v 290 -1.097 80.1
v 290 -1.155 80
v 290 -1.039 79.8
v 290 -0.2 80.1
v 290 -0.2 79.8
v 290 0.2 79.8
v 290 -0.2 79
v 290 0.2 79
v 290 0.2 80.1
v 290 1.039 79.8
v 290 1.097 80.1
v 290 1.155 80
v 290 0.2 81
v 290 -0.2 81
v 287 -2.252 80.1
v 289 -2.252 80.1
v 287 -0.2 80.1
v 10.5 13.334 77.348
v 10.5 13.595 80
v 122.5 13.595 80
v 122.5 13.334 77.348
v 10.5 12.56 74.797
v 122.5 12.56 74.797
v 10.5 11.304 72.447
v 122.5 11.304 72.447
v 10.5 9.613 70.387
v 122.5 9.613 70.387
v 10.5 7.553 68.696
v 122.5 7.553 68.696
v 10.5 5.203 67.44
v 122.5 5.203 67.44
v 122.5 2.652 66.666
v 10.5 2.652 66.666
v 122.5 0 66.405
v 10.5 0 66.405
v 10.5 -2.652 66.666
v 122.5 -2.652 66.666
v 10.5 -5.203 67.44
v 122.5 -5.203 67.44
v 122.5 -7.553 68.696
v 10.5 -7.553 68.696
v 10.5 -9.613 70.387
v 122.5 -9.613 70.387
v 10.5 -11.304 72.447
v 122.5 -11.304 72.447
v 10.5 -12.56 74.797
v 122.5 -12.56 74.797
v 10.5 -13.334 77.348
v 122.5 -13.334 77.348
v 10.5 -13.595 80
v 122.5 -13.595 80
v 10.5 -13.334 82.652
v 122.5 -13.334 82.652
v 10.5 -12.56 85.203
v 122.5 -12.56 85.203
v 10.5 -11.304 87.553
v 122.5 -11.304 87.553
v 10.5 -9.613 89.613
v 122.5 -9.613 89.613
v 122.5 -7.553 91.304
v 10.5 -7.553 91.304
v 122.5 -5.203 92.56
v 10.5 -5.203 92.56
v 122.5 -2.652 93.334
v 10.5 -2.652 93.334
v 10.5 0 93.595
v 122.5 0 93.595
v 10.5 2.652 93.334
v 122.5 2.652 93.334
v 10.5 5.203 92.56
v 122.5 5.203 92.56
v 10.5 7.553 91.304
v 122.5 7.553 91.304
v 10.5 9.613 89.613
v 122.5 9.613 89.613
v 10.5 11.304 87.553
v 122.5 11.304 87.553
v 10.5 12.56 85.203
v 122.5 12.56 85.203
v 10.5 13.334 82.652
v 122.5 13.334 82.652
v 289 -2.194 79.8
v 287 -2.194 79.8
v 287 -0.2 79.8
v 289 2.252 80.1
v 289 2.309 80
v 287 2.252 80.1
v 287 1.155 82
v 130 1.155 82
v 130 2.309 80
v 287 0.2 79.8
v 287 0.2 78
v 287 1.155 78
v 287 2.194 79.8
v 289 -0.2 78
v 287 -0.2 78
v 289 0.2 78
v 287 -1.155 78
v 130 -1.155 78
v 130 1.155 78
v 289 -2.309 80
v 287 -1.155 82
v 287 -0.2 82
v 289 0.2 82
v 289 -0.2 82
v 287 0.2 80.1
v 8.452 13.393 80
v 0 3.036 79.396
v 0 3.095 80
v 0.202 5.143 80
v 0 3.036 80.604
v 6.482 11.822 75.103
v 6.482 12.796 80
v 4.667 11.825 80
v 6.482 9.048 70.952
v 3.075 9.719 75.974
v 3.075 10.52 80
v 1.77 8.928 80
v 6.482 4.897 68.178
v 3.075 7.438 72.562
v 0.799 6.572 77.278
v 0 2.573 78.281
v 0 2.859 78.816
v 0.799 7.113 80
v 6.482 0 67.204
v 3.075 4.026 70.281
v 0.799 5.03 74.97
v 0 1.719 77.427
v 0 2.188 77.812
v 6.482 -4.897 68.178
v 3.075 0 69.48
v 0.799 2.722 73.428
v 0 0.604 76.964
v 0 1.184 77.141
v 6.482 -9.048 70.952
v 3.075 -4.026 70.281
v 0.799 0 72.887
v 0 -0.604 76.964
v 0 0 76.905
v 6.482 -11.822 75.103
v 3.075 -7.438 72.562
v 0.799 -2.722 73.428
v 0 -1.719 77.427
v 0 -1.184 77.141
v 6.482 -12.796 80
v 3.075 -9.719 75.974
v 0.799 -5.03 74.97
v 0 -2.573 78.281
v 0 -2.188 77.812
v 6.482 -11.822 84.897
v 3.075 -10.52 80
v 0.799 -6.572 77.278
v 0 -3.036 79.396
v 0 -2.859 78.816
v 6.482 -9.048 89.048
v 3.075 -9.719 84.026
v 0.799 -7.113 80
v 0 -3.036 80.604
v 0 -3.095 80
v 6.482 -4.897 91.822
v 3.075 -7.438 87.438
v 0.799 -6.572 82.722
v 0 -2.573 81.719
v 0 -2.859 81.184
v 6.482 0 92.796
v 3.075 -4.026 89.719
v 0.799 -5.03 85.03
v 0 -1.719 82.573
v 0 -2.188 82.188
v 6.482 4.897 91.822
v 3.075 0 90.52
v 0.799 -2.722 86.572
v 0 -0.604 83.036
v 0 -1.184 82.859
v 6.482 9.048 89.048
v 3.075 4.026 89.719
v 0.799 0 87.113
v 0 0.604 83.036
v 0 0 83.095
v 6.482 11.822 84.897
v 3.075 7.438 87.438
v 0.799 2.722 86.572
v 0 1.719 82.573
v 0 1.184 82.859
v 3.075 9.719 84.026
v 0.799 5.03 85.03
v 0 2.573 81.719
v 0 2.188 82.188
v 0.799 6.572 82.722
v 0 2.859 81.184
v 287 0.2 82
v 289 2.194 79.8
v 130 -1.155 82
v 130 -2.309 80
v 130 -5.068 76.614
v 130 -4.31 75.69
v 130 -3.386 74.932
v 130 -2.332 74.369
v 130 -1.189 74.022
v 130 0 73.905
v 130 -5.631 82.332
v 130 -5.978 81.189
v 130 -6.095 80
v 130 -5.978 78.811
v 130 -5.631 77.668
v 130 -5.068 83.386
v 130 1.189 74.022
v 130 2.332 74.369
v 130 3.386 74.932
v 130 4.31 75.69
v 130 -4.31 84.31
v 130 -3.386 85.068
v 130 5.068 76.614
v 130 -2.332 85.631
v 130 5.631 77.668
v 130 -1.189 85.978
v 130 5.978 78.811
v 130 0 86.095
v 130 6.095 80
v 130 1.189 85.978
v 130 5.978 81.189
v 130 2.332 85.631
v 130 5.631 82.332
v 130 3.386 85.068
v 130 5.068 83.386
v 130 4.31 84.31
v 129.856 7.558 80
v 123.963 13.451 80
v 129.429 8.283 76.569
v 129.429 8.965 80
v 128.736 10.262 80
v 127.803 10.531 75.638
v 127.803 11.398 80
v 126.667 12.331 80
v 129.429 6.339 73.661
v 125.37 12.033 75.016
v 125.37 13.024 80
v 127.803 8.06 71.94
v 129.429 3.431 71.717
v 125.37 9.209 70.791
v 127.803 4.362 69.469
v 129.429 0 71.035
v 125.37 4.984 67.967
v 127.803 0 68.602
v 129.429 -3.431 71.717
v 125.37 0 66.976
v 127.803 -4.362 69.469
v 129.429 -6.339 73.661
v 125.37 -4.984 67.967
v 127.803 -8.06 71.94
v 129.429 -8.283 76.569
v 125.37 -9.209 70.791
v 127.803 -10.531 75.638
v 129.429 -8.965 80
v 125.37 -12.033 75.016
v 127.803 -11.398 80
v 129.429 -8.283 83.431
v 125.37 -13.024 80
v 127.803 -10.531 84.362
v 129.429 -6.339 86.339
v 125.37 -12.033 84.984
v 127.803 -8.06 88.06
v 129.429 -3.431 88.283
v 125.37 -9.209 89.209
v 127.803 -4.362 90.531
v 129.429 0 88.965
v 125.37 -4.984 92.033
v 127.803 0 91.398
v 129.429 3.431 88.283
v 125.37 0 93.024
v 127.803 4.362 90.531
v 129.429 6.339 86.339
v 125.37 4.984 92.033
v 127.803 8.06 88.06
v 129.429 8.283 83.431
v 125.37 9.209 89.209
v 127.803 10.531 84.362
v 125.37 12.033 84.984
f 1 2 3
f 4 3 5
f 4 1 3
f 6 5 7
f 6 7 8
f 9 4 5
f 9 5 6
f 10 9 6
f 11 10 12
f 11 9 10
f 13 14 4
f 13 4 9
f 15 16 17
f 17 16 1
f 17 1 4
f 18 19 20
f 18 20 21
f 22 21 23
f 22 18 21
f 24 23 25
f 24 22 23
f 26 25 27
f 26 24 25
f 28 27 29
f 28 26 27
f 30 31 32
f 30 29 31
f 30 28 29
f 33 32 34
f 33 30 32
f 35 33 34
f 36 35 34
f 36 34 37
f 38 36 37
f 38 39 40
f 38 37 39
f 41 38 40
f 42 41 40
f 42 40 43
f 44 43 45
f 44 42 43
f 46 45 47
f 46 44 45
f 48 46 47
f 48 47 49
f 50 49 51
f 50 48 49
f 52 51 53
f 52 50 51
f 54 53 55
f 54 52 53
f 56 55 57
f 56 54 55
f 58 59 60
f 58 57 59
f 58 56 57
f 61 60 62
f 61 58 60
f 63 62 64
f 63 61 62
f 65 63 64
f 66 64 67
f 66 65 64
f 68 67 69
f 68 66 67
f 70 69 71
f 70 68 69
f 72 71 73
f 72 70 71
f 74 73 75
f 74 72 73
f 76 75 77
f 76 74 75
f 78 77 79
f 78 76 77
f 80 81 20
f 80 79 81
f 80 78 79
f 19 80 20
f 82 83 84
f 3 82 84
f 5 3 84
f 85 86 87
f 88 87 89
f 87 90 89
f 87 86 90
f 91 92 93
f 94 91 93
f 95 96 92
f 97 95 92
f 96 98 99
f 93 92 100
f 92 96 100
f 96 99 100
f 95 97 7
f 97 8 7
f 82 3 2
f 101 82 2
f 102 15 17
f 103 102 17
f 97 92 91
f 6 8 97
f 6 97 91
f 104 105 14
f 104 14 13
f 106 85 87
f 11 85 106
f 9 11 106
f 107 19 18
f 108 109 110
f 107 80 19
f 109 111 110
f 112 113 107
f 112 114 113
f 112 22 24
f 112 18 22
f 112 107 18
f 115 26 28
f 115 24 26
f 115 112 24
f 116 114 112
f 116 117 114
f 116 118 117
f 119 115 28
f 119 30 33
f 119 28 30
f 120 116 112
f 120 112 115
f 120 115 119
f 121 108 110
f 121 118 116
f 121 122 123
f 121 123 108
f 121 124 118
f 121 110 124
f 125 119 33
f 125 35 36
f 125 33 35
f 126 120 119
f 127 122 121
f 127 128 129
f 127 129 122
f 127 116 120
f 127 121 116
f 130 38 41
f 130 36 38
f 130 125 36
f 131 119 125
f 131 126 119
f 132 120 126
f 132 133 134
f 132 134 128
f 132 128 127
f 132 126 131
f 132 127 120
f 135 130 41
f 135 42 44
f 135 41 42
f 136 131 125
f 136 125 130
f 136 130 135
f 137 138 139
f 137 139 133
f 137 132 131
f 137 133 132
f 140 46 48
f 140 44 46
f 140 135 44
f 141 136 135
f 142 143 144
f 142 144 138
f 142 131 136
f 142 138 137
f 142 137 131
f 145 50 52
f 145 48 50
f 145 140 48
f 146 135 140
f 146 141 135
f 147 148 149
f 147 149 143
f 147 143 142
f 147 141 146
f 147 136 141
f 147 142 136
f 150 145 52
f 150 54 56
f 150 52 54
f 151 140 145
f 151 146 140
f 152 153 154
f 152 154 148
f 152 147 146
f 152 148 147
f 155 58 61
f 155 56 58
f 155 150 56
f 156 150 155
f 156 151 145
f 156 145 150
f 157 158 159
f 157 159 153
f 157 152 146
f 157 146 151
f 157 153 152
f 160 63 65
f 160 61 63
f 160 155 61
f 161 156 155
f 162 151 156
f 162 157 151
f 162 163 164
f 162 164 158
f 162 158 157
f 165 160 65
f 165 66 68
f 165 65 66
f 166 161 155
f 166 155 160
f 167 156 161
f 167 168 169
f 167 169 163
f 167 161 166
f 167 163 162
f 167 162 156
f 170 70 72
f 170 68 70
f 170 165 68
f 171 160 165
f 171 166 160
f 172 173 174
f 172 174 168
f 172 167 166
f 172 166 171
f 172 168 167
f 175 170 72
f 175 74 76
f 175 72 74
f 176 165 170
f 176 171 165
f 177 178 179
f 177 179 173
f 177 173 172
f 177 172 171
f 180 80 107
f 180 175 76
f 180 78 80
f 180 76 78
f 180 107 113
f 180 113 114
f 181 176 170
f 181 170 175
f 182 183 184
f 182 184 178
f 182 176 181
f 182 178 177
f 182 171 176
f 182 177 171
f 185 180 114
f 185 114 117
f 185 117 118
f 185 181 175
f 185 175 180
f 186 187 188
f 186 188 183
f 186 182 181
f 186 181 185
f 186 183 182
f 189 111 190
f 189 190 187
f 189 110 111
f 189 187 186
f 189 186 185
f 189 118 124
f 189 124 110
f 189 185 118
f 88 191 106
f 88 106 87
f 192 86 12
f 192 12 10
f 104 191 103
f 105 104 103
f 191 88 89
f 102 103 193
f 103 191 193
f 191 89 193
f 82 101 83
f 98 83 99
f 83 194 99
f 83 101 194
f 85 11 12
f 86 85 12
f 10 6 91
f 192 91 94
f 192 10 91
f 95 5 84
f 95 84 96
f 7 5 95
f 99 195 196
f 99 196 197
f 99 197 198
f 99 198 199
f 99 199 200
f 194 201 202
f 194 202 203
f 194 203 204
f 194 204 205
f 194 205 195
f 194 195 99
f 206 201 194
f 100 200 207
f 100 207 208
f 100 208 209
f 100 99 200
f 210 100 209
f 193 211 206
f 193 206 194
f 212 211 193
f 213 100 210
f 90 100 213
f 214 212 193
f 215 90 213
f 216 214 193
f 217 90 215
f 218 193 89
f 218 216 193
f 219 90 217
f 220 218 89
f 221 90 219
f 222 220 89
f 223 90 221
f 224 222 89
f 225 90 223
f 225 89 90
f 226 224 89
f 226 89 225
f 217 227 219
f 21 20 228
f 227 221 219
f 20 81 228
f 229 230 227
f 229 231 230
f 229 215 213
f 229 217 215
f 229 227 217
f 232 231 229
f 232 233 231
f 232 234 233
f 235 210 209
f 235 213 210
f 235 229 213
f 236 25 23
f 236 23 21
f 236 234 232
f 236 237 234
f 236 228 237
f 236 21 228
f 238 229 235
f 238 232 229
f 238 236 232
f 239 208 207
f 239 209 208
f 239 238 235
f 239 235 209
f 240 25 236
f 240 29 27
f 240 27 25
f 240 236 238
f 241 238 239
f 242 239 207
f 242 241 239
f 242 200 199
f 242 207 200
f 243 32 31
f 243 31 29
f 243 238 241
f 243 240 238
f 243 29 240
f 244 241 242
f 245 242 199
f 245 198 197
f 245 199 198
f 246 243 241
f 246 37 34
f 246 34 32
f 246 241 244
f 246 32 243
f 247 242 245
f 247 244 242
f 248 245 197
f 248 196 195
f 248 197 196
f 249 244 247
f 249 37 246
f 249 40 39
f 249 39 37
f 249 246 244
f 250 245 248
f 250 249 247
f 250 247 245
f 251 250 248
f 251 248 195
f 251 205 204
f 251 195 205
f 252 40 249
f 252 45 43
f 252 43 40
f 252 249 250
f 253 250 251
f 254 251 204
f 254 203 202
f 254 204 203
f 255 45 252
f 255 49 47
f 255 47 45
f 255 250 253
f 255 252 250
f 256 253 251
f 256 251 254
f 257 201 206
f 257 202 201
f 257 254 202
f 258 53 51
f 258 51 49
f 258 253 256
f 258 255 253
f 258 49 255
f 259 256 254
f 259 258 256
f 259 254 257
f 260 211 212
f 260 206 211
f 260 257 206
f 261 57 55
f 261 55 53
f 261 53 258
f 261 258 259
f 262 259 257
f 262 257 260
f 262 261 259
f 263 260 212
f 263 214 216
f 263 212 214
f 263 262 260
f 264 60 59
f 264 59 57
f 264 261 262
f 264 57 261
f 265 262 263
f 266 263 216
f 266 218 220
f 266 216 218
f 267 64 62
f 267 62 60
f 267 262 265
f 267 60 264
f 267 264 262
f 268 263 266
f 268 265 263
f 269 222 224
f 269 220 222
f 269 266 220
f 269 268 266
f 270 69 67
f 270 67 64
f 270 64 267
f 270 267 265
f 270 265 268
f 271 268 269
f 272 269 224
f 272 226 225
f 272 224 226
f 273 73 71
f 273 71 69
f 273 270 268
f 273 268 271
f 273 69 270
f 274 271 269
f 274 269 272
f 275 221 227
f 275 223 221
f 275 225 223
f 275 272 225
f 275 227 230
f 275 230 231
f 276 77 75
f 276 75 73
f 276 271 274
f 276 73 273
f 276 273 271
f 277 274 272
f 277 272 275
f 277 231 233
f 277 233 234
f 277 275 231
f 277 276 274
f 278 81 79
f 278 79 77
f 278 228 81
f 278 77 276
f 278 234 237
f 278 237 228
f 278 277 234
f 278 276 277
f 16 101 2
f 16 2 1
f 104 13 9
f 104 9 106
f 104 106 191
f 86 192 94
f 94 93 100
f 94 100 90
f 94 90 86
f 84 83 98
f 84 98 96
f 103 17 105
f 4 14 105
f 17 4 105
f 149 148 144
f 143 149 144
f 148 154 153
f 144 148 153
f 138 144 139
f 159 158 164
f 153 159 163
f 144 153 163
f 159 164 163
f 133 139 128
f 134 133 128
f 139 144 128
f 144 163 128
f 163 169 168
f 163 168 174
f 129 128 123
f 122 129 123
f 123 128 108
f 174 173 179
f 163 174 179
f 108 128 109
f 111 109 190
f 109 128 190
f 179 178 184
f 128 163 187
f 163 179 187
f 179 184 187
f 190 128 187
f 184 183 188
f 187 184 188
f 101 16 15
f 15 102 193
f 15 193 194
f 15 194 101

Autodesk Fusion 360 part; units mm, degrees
sketch "Sketch1" plane through (0, 0, 0) normal (1, 0, 0) x (0, 1, 0)
  circle A0 centre (0, 80) radius 13.595
  dimension "d2" = 27.19
extrude "Extrude1" add sketch "Sketch1" along normal blind 130
sketch "Sketch2" plane through (130, 0, 0) normal (1, 0, 0) x (0, 1, 0)
  circle A0 centre (0, 80) radius 13.595
  line L0 (1.1547, 78) -> (2.3094, 80)
  line L1 (2.3094, 80) -> (1.1547, 82)
  line L2 (1.1547, 82) -> (-1.1547, 82)
  line L3 (-1.1547, 82) -> (-2.3094, 80)
  line L4 (-2.3094, 80) -> (-1.1547, 78)
  line L5 (-1.1547, 78) -> (1.1547, 78)
  point P0 (0, 80)
  dimension "d5" = 2
extrude "Extrude2" add sketch "Sketch2" along normal blind 160 contours L0 L1 L2 L3 L4 L5
chamfer "Chamfer1" distance 1 angle 45 6 edges at (290, -1.7321, 81) (290, 0, 82) (290, -1.7321, 79) (290, 0, 78) (290, 1.7321, 79) (290, 1.7321, 81)
sketch "Sketch3" plane through (130, 0, 0) normal (1, 0, 0) x (0, 1, 0)
  line L0 (-1.1547, 78) -> (-2.3094, 80)
  line L1 (-2.3094, 80) -> (-1.1547, 82)
  line L2 (-1.1547, 82) -> (1.1547, 82)
  line L3 (1.1547, 82) -> (2.3094, 80)
  line L4 (2.3094, 80) -> (1.1547, 78)
  line L5 (1.1547, 78) -> (-1.1547, 78)
  circle A0 centre (0, 80) radius 13.595
sketch "Sketch4" plane through (290, 0, 0) normal (1, 0, 0) x (0, 1, 0)
  line L0 (0.5774, 79) -> (1.1547, 80)
  line L1 (1.1547, 80) -> (0.5774, 81)
  line L2 (0.5774, 81) -> (-0.5774, 81)
  line L3 (-0.5774, 81) -> (-1.1547, 80)
  line L4 (-1.1547, 80) -> (-0.5774, 79)
  line L5 (-0.5774, 79) -> (0.5774, 79)
  line L6 (-0.2, 80.1) -> (-0.2, 82.1)
  line L7 (-0.2, 82.1) -> (-2.8, 82.1)
  line L8 (-2.8, 82.1) -> (-2.8, 80.1)
  line L9 (-2.8, 80.1) -> (-0.2, 80.1)
  line L10 (0.2, 80.1) -> (0.2, 82.1)
  line L11 (0.2, 82.1) -> (2.8, 82.1)
  line L12 (2.8, 82.1) -> (2.8, 80.1)
  line L13 (2.8, 80.1) -> (0.2, 80.1)
  line L14 (0.2, 79.8) -> (2.8, 79.8)
  line L15 (2.8, 79.8) -> (2.8, 77.7841)
  line L16 (2.8, 77.7841) -> (0.2, 77.7841)
  line L17 (0.2, 77.7841) -> (0.2, 79.8)
  line L18 (-0.2, 79.8) -> (-0.2, 77.7841)
  line L19 (-0.2, 77.7841) -> (-2.5, 77.5)
  line L20 (-2.5, 77.5) -> (-2.5, 79.8)
  line L21 (-2.5, 79.8) -> (-0.2, 79.8)
extrude "Extrude3" cut sketch "Sketch4" against normal blind 3 contours L0 L5 L14 L17 | L0 L5 L14 L15 L16 L17 | L4 L5 L18 L19 L20 L21 | L4 L5 L18 L21 | L1 L2 L10 L13 | L1 L2 L10 L11 L12 L13 | L2 L3 L6 L9 | L2 L3 L6 L7 L8 L9
fillet "Fillet1" radius 7.5 1 edges at (130, -12.675, 75.0838)
fillet "Fillet2" radius 10.5 1 edges at (0, -12.675, 75.0838)
equation "diamiter = 27.19 mm"
equation "d2 = diamiter"
